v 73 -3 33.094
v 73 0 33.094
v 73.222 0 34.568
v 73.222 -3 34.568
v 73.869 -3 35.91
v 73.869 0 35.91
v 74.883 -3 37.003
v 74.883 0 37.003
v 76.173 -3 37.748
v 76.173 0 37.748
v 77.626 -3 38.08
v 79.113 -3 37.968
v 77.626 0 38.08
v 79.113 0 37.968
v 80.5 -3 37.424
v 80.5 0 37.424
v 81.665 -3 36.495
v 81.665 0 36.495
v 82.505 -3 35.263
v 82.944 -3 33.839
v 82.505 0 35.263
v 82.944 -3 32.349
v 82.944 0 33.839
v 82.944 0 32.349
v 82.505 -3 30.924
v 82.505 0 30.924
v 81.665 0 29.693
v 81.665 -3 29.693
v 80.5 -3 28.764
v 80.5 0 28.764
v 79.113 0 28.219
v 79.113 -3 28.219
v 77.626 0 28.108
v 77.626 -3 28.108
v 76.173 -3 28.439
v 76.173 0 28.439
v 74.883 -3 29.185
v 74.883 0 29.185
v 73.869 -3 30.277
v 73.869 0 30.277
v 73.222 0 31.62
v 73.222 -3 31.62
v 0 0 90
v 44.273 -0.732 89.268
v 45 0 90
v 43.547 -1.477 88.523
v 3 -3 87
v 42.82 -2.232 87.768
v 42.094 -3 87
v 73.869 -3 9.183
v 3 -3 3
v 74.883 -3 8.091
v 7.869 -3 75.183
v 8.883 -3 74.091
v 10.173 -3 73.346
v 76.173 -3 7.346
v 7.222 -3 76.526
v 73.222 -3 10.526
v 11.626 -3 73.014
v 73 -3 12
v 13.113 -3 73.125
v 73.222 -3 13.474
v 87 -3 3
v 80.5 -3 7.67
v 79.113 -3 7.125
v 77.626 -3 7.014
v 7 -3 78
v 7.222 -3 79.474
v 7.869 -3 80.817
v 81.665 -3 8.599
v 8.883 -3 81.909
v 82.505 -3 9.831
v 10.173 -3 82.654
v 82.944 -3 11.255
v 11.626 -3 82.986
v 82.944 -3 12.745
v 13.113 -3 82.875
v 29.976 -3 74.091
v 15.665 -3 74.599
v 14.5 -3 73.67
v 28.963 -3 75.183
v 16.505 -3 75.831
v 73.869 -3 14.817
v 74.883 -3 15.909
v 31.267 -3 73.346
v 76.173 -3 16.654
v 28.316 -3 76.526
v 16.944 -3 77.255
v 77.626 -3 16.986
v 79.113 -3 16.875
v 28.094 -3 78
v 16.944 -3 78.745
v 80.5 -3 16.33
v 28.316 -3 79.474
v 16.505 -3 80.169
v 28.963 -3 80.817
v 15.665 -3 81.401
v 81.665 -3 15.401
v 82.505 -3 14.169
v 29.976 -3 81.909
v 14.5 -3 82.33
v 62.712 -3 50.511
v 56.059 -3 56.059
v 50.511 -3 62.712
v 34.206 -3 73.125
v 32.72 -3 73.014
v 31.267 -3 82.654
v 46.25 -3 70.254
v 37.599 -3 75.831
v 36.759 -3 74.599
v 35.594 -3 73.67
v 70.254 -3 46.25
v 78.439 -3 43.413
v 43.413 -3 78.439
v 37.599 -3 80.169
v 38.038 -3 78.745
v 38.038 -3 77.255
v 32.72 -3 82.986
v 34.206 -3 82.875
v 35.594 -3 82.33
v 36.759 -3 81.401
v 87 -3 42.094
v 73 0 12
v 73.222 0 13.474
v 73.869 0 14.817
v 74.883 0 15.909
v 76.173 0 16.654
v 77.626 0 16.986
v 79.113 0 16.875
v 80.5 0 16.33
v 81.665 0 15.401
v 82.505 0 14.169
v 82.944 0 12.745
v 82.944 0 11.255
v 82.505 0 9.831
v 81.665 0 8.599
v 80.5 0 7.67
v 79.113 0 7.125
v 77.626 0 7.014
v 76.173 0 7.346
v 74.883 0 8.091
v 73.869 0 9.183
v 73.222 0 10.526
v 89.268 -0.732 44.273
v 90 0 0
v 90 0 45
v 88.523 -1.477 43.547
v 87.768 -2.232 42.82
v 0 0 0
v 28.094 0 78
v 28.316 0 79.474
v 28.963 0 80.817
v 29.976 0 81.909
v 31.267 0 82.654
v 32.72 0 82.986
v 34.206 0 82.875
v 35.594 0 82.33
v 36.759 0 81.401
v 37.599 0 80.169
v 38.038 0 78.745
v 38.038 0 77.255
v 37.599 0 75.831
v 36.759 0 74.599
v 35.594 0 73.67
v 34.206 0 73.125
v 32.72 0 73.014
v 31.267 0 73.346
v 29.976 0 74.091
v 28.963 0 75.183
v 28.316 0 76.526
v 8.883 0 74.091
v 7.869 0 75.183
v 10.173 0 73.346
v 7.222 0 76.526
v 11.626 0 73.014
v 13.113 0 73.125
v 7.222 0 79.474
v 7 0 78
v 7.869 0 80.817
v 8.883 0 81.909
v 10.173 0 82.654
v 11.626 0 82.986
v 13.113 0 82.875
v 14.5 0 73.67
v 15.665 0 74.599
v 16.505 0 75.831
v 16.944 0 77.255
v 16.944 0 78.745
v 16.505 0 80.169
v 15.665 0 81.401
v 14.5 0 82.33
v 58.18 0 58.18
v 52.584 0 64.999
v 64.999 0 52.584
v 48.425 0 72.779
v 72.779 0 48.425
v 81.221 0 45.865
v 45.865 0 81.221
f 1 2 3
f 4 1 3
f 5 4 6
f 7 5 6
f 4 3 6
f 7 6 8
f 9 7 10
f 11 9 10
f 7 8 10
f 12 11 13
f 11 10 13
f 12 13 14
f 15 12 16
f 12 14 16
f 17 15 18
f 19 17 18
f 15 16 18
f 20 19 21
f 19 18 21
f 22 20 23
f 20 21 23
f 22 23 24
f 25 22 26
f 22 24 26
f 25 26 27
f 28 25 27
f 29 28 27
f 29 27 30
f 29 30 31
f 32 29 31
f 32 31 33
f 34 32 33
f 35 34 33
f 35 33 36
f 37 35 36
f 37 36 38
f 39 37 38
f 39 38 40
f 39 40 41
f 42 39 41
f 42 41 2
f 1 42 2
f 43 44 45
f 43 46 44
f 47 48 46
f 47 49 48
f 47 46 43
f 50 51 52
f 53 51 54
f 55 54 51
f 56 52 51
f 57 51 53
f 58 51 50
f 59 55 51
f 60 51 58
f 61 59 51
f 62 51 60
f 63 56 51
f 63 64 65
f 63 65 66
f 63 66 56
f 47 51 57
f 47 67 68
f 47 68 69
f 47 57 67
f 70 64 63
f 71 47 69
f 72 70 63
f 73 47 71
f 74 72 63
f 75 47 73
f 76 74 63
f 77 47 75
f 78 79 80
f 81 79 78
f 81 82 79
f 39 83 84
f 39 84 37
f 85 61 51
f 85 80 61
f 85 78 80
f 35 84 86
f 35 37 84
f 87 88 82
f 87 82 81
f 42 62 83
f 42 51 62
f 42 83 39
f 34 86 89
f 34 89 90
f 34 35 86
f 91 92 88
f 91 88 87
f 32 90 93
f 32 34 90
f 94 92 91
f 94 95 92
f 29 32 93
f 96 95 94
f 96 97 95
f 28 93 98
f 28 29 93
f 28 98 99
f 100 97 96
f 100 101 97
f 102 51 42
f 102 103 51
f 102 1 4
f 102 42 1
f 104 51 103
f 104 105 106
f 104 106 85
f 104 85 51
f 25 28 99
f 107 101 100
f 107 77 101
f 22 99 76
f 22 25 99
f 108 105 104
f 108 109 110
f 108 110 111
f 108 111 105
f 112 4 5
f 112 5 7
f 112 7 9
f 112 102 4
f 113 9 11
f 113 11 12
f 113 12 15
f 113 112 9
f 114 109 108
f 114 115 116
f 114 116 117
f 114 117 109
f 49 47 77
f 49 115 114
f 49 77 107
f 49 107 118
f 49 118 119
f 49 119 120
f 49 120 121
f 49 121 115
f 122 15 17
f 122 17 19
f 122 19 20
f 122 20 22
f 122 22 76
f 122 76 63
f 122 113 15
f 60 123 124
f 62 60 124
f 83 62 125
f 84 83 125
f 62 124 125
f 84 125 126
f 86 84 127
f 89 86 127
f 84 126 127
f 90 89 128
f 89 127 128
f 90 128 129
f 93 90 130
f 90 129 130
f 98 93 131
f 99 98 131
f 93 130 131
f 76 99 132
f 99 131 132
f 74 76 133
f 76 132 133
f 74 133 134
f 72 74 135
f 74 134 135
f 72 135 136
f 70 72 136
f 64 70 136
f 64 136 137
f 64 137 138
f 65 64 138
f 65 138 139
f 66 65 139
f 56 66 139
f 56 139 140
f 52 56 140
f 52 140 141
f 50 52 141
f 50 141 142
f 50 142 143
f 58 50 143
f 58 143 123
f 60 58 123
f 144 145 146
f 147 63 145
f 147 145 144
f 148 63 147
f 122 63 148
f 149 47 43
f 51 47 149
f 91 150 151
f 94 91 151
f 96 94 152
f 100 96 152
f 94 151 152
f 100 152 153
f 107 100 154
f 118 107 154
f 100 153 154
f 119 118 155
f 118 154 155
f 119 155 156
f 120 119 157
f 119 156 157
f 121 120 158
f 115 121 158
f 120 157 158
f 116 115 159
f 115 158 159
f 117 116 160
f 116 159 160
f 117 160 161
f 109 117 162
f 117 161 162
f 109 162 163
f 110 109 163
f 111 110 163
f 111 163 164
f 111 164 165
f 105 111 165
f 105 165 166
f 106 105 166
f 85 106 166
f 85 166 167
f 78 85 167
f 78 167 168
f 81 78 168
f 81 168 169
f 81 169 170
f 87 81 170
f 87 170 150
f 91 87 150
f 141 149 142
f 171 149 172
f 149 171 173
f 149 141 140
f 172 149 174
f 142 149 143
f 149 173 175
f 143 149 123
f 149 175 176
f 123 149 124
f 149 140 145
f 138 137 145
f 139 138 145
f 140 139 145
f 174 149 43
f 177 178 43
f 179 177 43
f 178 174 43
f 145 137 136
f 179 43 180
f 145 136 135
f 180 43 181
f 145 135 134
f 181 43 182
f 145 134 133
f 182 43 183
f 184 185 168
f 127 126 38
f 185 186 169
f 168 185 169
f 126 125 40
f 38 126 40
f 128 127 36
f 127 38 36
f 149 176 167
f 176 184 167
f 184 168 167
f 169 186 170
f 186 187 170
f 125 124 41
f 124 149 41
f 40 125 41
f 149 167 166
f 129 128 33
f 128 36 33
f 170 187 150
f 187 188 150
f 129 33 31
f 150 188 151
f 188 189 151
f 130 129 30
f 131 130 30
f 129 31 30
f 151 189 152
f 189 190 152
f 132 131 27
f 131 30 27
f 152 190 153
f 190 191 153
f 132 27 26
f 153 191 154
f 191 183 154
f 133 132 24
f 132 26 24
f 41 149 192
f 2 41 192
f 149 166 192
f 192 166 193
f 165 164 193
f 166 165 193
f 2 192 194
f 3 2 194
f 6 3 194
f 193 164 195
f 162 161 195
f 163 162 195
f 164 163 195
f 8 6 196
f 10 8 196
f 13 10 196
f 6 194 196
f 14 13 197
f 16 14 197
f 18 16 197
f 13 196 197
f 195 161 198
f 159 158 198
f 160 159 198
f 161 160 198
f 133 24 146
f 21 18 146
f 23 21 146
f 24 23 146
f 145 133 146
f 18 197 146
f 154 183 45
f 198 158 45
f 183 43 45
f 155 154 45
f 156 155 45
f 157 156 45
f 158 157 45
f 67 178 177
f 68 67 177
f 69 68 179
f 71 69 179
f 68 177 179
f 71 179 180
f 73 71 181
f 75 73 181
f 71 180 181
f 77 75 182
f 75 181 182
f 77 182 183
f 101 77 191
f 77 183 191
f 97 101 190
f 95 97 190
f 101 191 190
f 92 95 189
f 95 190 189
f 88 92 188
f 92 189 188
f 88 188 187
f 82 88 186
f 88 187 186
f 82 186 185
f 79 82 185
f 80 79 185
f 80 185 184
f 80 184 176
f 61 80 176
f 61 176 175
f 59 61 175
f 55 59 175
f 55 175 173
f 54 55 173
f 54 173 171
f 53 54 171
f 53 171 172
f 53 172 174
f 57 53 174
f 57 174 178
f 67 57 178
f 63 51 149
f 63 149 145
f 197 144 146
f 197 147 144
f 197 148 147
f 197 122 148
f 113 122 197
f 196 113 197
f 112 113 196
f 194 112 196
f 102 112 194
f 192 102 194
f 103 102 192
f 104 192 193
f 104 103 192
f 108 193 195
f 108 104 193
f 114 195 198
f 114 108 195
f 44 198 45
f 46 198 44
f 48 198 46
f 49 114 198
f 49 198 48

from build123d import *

# Parameters (mm, degrees)
F1_DEPTH = 3
F2_SIZE  = 2.99999
F4_D     = 10
F4_DEPTH = 9
F4_TIP   = 3.0043030951


# Not quite as in the source:
# - a fillet or chamfer is up to 0.001 mm smaller than in the source, because OpenCascade refuses the exact size


with BuildPart() as f1:
    # F0 (on Front) → F1 (new body)
    with BuildSketch(Plane.XZ):
        with BuildLine():
            Line((0, 90), (0, 0))
            Line((0, 0), (90, 0))
            Line((90, 0), (90, 45))
            ThreePointArc((90, 45), (58.1801948466, 58.1801948466), (45, 90))
            Line((45, 90), (0, 90))
        make_face()
    extrude(amount=F1_DEPTH)

    # F2 (size 3 in the source; OpenCascade refuses exactly that, so slightly less here)
    f2_edges = [f1.edges().sort_by_distance(p)[0] for p in [
        (22.5, -3, 90),
        (0, -3, 45),
        (45, -3, 0),
        (90, -3, 22.5),
        (58.180195, -3, 58.180195),
    ]]
    chamfer(f2_edges, length=F2_SIZE)

    # F4
    with Locations(Plane.XZ.offset(3)):
        with Locations((12, 78), (33.093841732, 78), (78, 33.093841732), (78, 12)):
            Hole(F4_D / 2, depth=F4_DEPTH)
            with Locations((0, 0, -(F4_DEPTH + F4_TIP / 2))):  # 118° drill point
                Cone(0, F4_D / 2, F4_TIP, mode=Mode.SUBTRACT)


solid = f1.part
